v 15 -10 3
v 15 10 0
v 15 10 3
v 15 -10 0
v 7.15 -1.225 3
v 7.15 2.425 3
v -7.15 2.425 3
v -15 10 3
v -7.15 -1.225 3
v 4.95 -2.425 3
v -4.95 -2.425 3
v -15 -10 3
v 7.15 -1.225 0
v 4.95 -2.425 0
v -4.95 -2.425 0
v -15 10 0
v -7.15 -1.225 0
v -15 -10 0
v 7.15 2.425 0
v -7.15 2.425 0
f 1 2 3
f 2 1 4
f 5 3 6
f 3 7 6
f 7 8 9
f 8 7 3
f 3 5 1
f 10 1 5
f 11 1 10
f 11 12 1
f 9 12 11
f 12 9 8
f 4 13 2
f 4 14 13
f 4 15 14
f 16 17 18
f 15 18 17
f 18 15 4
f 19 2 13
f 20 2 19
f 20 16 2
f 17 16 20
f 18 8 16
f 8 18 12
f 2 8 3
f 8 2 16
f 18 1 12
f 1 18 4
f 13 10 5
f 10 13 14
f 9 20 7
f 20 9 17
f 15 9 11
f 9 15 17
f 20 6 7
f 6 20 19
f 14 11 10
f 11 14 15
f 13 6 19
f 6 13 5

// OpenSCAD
// HDMI Type A Socket (Port Cutout)
// 3Dプリンタでの出力を想定し、少し余裕（クリアランス）を持たせています

module hdmi_socket_cutout(depth = 12, clearance = 0.2) {
    // 基本寸法 + クリアランス
    w_top = 14.0 + clearance;
    w_bottom = 9.6 + clearance;
    h = 4.55 + clearance;
    
    // 座標計算
    x1 = w_top / 2;
    x2 = w_bottom / 2;
    y1 = h / 2;
    y2 = -h / 2;
    slope_h = 1.2; // 下部の傾斜が始まる高さ

    translate([0, 0, 0])
    linear_extrude(height = depth) {
        polygon(points = [
            [-x1,  y1], 
            [ x1,  y1], 
            [ x1,  y2 + slope_h], 
            [ x2,  y2], 
            [-x2,  y2], 
            [-x1,  y2 + slope_h]
        ]);
    }
}




// --- 使用例: ケースの壁に穴を開ける ---
difference() {
    // ケースの壁面（例）
    translate([-15, -10, 0]) cube([30, 20, 3]); 
    
    // HDMIポートを配置（壁を貫通させるために少しずらす）
    translate([0, 0, -1]) 
        hdmi_socket_cutout(depth = 5, clearance = 0.3);
}
